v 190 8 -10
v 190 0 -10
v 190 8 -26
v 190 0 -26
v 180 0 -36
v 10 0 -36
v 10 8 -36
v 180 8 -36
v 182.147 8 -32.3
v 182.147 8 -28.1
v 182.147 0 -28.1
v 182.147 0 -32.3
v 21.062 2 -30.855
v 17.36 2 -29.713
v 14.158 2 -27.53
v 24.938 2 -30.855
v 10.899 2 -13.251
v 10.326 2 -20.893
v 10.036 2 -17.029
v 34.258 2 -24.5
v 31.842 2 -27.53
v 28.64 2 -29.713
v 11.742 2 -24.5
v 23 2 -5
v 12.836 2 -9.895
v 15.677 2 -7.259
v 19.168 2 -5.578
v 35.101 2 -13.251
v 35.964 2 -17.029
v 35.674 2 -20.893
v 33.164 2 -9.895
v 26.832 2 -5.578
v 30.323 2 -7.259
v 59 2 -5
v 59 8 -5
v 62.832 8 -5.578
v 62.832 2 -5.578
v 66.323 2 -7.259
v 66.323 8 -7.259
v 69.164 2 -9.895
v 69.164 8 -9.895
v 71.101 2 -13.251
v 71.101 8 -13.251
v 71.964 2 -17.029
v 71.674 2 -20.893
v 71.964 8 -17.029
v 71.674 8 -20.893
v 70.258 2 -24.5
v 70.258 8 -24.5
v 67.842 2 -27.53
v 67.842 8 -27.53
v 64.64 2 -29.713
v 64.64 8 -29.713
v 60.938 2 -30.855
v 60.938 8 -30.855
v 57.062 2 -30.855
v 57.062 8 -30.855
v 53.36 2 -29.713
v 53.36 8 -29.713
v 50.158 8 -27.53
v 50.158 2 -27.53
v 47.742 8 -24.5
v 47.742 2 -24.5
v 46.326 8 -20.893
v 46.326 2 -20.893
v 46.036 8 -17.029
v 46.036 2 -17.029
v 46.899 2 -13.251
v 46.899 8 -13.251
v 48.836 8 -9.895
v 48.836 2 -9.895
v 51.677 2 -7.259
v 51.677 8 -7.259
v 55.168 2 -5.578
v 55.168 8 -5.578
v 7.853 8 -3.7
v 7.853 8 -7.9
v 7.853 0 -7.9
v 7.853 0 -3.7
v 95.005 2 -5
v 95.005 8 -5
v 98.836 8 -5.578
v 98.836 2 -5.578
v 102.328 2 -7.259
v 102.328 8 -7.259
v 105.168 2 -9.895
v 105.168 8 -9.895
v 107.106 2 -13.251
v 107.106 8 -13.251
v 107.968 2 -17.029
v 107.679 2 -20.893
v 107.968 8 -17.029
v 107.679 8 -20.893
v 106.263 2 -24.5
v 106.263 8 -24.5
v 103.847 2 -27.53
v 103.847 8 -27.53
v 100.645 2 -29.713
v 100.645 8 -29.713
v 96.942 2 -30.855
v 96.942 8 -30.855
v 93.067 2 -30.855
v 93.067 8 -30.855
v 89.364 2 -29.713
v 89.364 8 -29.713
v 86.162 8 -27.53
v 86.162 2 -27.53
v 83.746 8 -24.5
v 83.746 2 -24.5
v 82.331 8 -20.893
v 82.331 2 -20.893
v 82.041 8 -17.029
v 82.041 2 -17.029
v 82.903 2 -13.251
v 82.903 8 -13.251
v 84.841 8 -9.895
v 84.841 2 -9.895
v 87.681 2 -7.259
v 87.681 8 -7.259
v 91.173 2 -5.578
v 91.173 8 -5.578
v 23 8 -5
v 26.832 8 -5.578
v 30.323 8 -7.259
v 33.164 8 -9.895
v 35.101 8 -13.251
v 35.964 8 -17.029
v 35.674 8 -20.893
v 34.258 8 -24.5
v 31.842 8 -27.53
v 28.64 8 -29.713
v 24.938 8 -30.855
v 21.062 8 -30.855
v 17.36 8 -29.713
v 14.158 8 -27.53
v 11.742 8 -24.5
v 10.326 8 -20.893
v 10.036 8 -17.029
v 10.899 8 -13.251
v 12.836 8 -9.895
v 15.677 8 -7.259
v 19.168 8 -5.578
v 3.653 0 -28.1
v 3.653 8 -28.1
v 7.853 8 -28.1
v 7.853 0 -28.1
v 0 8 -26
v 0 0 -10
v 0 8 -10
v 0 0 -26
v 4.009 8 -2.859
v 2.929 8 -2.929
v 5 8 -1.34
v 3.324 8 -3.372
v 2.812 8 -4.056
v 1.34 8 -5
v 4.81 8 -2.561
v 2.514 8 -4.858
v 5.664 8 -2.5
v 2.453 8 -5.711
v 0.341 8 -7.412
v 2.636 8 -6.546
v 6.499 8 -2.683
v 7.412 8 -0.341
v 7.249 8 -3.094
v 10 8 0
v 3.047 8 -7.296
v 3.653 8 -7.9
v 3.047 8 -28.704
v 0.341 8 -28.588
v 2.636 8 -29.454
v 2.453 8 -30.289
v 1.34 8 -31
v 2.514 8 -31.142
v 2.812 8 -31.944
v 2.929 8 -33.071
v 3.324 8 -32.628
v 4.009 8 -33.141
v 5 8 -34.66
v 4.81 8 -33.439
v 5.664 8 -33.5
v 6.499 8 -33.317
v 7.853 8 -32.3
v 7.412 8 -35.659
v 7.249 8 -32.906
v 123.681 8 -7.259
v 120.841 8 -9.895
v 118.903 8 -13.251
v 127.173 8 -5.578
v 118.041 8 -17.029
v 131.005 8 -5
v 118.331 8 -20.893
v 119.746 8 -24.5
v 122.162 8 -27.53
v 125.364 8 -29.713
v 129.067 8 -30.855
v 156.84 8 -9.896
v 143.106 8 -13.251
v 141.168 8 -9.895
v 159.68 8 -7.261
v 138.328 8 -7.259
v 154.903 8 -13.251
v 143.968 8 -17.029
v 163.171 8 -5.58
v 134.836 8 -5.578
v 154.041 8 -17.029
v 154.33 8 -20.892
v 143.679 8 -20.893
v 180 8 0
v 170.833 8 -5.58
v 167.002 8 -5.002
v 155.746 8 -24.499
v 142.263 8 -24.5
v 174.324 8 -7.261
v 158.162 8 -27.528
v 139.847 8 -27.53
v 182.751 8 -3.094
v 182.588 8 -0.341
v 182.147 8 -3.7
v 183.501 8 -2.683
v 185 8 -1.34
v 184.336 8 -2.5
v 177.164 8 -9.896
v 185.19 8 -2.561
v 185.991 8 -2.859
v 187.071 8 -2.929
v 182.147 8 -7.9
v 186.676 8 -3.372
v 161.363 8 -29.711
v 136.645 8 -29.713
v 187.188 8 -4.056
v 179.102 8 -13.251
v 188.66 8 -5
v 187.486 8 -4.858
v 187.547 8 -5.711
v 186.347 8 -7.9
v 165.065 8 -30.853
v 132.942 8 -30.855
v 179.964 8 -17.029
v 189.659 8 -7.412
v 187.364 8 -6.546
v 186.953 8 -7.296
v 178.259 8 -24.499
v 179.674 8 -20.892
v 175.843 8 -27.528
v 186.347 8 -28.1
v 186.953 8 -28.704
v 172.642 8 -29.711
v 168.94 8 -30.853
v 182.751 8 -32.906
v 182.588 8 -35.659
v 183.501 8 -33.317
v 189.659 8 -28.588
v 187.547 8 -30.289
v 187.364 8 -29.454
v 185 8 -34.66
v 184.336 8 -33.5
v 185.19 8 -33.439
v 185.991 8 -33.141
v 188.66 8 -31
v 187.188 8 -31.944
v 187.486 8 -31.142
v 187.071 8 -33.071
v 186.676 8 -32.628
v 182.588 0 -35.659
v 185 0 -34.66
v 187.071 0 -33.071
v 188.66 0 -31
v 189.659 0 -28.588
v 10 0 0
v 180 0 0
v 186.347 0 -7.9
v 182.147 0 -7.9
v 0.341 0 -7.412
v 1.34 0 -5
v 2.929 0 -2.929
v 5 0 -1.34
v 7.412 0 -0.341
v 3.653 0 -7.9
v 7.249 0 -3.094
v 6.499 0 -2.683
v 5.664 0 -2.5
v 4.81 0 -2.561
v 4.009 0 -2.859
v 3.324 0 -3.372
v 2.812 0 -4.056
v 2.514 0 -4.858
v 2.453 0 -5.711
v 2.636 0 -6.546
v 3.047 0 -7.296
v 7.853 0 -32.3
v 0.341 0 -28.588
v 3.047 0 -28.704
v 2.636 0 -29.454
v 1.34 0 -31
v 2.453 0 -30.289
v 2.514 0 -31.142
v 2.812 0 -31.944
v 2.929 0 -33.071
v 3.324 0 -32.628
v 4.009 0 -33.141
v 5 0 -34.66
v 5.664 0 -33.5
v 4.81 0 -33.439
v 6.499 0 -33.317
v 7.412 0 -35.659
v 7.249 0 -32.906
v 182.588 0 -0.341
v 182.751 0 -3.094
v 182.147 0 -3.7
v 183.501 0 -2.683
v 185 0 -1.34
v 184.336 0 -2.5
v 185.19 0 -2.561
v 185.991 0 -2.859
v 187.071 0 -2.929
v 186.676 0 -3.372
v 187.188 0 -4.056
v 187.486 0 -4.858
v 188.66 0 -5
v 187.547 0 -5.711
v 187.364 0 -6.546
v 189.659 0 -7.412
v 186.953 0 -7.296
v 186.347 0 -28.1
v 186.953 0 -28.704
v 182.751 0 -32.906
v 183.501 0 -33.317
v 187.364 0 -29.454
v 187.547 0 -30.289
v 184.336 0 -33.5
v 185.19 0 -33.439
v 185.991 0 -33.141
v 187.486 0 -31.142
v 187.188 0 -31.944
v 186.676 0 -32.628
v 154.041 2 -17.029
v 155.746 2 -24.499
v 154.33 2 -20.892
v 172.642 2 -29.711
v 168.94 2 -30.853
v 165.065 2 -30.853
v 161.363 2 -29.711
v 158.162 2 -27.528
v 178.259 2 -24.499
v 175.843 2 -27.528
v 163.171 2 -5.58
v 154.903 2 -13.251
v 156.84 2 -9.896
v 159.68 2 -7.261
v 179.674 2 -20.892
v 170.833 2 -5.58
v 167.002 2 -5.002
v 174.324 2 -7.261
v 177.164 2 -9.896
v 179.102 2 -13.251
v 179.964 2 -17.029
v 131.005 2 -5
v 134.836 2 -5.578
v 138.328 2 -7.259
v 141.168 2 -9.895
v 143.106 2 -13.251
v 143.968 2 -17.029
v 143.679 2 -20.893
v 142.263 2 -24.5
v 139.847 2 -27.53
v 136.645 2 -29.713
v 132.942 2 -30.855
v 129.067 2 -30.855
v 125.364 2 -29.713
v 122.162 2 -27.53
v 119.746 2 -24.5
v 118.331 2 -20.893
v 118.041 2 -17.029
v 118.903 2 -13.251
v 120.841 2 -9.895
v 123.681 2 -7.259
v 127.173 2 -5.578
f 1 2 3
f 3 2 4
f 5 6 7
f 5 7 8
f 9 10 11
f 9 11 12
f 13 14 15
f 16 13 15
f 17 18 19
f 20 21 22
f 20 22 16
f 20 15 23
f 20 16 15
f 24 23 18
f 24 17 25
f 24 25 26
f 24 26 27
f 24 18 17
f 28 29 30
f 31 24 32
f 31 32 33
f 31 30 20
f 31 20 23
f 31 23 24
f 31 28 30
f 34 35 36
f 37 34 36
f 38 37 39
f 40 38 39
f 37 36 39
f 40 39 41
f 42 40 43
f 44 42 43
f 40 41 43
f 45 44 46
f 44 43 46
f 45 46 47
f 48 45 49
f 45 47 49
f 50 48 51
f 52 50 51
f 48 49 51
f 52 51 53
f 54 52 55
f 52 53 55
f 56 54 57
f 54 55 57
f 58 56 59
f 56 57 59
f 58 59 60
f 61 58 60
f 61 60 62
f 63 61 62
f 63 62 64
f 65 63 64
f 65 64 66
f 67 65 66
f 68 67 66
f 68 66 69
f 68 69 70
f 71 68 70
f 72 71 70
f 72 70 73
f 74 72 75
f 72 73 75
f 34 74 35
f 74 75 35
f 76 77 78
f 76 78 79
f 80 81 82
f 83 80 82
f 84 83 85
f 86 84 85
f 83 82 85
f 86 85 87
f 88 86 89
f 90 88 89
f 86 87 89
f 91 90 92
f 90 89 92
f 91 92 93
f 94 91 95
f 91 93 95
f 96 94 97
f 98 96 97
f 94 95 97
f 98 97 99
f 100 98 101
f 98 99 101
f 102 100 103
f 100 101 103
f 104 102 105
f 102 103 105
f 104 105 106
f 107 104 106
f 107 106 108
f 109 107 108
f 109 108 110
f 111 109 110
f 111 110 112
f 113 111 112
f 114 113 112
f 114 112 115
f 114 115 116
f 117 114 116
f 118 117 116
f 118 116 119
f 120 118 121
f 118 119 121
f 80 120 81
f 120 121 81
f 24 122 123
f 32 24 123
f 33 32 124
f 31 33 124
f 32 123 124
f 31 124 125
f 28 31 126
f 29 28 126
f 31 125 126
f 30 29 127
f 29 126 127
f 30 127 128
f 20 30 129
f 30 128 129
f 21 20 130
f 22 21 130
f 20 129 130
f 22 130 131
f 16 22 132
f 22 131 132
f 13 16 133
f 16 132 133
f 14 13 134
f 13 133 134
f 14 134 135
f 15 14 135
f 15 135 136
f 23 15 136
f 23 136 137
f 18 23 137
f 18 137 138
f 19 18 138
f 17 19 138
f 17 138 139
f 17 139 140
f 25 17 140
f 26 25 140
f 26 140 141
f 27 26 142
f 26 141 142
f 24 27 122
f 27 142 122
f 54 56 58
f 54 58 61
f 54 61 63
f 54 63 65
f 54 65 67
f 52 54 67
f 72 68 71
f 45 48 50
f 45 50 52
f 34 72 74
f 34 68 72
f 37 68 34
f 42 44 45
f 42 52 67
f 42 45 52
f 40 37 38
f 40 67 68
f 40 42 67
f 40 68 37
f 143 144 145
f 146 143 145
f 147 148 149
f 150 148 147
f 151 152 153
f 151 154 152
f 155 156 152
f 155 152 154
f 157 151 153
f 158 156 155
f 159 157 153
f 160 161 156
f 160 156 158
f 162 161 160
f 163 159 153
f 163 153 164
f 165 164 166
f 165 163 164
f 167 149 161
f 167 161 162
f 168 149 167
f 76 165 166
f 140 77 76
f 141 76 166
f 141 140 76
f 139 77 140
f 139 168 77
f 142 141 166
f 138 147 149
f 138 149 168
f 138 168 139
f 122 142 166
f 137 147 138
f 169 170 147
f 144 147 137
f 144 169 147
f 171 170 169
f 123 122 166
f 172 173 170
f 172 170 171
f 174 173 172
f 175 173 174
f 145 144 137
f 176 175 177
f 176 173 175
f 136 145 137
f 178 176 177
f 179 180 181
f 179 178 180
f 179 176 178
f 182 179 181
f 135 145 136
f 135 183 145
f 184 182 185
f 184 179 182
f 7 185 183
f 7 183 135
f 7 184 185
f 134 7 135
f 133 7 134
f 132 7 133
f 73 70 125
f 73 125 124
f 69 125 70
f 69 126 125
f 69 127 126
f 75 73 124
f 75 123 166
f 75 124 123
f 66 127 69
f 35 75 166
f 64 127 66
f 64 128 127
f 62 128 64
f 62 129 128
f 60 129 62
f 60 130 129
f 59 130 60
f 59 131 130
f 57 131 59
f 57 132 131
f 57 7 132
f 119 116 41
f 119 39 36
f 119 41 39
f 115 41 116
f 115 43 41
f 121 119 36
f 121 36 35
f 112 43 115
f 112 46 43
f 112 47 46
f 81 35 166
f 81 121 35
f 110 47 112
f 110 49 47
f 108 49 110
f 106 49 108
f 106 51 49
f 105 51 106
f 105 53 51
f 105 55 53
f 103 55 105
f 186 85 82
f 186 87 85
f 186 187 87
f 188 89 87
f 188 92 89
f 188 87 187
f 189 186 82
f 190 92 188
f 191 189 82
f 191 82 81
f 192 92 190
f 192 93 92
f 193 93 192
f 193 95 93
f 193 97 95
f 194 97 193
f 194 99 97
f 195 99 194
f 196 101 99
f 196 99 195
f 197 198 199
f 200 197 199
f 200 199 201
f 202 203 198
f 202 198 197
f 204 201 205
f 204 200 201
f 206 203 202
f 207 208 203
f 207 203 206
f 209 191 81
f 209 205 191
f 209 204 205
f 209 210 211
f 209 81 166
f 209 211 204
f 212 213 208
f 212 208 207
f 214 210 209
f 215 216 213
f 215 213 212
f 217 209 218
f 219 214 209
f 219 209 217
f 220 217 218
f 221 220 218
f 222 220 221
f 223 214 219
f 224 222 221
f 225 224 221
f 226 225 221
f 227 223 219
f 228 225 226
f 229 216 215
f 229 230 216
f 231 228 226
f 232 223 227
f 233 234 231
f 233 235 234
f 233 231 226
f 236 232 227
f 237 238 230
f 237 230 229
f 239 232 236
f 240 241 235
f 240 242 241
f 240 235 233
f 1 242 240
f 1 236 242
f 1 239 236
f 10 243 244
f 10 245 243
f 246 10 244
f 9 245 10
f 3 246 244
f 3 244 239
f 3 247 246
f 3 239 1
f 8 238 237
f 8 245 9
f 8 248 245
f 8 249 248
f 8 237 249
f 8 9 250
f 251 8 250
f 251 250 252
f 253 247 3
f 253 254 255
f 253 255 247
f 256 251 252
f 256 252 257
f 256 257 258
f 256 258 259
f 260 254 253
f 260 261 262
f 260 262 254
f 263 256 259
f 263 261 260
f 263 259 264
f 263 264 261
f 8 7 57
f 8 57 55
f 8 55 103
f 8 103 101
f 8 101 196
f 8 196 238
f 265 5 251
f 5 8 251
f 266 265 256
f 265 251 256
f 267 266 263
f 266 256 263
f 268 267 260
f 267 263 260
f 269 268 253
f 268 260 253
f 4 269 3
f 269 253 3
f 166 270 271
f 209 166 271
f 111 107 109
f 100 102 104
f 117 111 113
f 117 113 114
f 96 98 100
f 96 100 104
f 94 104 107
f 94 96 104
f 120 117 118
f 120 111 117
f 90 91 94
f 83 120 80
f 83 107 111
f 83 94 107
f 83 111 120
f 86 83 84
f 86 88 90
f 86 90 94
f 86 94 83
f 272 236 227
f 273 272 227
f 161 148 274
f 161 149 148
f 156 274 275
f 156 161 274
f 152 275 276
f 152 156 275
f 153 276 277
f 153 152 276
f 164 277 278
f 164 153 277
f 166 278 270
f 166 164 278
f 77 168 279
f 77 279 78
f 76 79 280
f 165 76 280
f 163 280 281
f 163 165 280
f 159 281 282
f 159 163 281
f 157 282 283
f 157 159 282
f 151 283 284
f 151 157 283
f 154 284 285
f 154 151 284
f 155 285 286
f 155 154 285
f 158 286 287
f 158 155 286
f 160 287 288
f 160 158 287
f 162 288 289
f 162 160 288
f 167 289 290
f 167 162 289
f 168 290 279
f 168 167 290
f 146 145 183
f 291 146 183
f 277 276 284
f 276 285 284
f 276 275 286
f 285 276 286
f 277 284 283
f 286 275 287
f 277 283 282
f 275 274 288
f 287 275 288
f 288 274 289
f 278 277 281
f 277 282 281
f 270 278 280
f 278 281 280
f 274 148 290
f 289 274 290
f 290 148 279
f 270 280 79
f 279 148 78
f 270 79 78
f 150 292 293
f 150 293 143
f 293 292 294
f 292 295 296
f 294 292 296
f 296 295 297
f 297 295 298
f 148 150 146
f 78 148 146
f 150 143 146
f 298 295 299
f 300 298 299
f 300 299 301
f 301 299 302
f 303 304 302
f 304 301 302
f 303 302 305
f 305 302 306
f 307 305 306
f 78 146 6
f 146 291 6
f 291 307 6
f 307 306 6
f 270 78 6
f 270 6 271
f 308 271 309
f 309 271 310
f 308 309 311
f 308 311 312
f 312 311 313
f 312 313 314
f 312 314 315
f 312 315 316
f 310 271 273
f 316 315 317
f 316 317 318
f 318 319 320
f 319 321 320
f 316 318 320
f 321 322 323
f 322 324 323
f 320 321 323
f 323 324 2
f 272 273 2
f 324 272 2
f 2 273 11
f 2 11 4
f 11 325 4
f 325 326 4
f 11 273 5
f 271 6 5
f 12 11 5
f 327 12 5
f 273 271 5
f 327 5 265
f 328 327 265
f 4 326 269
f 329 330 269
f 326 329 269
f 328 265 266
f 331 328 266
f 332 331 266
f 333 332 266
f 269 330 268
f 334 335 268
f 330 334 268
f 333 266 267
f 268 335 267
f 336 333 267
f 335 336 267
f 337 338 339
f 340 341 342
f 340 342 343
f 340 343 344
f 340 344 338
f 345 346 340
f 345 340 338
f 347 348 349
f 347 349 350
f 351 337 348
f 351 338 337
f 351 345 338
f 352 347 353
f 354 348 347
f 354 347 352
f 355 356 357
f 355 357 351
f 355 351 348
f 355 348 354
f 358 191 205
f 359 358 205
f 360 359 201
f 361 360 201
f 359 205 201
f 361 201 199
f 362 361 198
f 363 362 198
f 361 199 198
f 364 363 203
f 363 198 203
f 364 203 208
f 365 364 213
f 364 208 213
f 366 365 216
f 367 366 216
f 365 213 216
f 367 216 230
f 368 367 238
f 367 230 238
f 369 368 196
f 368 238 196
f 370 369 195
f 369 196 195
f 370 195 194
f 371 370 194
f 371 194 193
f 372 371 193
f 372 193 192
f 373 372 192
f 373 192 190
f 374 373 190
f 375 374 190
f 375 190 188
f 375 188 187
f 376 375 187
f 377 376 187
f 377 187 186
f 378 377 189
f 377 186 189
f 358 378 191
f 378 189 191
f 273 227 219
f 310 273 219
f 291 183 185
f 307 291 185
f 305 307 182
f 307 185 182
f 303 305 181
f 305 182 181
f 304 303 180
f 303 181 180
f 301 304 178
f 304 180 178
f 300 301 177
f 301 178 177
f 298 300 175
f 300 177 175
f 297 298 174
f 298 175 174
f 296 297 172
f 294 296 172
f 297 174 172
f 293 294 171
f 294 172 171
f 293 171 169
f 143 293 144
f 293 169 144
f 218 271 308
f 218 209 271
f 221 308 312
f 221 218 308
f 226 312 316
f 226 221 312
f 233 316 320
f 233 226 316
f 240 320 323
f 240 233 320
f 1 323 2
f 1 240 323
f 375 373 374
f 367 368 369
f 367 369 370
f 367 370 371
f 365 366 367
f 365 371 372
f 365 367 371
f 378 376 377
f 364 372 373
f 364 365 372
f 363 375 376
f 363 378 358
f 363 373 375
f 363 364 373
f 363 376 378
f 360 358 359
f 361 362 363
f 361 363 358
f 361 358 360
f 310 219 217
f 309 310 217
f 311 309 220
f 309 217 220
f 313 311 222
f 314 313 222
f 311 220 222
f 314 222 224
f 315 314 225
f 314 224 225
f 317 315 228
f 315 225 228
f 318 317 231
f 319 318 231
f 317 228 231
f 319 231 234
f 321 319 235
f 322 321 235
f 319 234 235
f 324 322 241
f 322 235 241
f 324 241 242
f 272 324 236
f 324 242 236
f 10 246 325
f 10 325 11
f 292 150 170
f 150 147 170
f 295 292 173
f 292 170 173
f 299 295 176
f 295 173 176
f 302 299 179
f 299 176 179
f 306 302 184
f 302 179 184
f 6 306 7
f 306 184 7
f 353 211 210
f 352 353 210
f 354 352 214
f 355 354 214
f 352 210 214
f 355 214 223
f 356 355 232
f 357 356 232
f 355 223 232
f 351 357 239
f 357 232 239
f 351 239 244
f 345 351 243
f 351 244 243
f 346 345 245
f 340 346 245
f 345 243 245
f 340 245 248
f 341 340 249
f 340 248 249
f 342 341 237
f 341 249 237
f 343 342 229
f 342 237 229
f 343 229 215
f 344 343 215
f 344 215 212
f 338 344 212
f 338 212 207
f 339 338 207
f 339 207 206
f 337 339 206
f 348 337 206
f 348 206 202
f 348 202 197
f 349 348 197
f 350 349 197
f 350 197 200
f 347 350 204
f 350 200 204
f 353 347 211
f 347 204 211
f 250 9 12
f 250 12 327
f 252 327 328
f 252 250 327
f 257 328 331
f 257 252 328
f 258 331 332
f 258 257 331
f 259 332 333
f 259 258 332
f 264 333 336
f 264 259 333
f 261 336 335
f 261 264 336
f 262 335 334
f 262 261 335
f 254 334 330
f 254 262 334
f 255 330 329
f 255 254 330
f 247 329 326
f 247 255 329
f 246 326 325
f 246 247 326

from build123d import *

# Parameters (mm, degrees)
SKETCH5_W           = 190
SKETCH5_H           = 36
BOSS_EXTRUDE1_DEPTH = 8
SKETCH6_R           = 13
SKETCH6_R_2         = 12.99768992
CUT_EXTRUDE1_DEPTH  = 6
FILLET1_R           = 10
CUT_EXTRUDE2_DEPTH  = 8


with BuildPart() as part:
    # Sketch5 → Boss-Extrude1 (new body)
    with BuildSketch(Plane(origin=(0, 0, 0), x_dir=(1, 0, 0), z_dir=(0, 1, 0))):
        with Locations((95, 18)):
            Rectangle(SKETCH5_W, SKETCH5_H)
    extrude(amount=BOSS_EXTRUDE1_DEPTH)

    # Sketch6 → Cut-Extrude1 (cut)
    with BuildSketch(Plane(origin=(0, 8, 0), x_dir=(1, 0, 0), z_dir=(0, 1, 0))):
        with Locations(Location((23, 18, 0), (0, 0, 270))):
            Circle(SKETCH6_R)
        with Locations(Location((59, 18, 0), (0, 0, 270))):
            Circle(SKETCH6_R)
        with Locations(Location((95.004620161, 18, 0), (0, 0, 270))):
            Circle(SKETCH6_R)
        with Locations(Location((131.004620161, 18, 0), (0, 0, 270))):
            Circle(SKETCH6_R)
        with Locations(Location((167.00231008, 18, 0), (0, 0, 270))):
            Circle(SKETCH6_R_2)
    extrude(amount=-CUT_EXTRUDE1_DEPTH, mode=Mode.SUBTRACT)

    # Fillet1
    fillet1_edges = [part.edges().sort_by_distance(p)[0] for p in [
        (0, 4, -36),
        (190, 4, -36),
        (190, 4, 0),
        (0, 4, 0),
    ]]
    fillet(fillet1_edges, radius=FILLET1_R)

    # Sketch9 → Cut-Extrude2 (cut)
    with BuildSketch(Plane(origin=(0, 8, 0), x_dir=(1, 0, 0), z_dir=(0, 1, 0))):
        with BuildLine():
            Line((3.652564445, 7.899803831), (7.852564445, 7.899803831))
            Line((7.852564445, 7.899803831), (7.852564445, 3.699803831))
            ThreePointArc((7.852564445, 3.699803831), (3.324368465, 3.371607851), (3.652564445, 7.899803831))
        make_face()
        with BuildLine():
            Line((7.852564445, 28.100196169), (7.852564445, 32.300196169))
            ThreePointArc((7.852564445, 32.300196169), (3.324368465, 32.628392149), (3.652564445, 28.100196169))
            Line((3.652564445, 28.100196169), (7.852564445, 28.100196169))
        make_face()
        with BuildLine():
            Line((182.147435555, 7.899803831), (182.147435555, 3.699803831))
            ThreePointArc((182.147435555, 3.699803831), (186.675631535, 3.371607851), (186.347435555, 7.899803831))
            Line((186.347435555, 7.899803831), (182.147435555, 7.899803831))
        make_face()
        with BuildLine():
            Line((182.147435555, 28.100196169), (182.147435555, 32.300196169))
            ThreePointArc((182.147435555, 32.300196169), (186.675631535, 32.628392149), (186.347435555, 28.100196169))
            Line((186.347435555, 28.100196169), (182.147435555, 28.100196169))
        make_face()
    extrude(amount=-CUT_EXTRUDE2_DEPTH, mode=Mode.SUBTRACT)


solid = part.part
